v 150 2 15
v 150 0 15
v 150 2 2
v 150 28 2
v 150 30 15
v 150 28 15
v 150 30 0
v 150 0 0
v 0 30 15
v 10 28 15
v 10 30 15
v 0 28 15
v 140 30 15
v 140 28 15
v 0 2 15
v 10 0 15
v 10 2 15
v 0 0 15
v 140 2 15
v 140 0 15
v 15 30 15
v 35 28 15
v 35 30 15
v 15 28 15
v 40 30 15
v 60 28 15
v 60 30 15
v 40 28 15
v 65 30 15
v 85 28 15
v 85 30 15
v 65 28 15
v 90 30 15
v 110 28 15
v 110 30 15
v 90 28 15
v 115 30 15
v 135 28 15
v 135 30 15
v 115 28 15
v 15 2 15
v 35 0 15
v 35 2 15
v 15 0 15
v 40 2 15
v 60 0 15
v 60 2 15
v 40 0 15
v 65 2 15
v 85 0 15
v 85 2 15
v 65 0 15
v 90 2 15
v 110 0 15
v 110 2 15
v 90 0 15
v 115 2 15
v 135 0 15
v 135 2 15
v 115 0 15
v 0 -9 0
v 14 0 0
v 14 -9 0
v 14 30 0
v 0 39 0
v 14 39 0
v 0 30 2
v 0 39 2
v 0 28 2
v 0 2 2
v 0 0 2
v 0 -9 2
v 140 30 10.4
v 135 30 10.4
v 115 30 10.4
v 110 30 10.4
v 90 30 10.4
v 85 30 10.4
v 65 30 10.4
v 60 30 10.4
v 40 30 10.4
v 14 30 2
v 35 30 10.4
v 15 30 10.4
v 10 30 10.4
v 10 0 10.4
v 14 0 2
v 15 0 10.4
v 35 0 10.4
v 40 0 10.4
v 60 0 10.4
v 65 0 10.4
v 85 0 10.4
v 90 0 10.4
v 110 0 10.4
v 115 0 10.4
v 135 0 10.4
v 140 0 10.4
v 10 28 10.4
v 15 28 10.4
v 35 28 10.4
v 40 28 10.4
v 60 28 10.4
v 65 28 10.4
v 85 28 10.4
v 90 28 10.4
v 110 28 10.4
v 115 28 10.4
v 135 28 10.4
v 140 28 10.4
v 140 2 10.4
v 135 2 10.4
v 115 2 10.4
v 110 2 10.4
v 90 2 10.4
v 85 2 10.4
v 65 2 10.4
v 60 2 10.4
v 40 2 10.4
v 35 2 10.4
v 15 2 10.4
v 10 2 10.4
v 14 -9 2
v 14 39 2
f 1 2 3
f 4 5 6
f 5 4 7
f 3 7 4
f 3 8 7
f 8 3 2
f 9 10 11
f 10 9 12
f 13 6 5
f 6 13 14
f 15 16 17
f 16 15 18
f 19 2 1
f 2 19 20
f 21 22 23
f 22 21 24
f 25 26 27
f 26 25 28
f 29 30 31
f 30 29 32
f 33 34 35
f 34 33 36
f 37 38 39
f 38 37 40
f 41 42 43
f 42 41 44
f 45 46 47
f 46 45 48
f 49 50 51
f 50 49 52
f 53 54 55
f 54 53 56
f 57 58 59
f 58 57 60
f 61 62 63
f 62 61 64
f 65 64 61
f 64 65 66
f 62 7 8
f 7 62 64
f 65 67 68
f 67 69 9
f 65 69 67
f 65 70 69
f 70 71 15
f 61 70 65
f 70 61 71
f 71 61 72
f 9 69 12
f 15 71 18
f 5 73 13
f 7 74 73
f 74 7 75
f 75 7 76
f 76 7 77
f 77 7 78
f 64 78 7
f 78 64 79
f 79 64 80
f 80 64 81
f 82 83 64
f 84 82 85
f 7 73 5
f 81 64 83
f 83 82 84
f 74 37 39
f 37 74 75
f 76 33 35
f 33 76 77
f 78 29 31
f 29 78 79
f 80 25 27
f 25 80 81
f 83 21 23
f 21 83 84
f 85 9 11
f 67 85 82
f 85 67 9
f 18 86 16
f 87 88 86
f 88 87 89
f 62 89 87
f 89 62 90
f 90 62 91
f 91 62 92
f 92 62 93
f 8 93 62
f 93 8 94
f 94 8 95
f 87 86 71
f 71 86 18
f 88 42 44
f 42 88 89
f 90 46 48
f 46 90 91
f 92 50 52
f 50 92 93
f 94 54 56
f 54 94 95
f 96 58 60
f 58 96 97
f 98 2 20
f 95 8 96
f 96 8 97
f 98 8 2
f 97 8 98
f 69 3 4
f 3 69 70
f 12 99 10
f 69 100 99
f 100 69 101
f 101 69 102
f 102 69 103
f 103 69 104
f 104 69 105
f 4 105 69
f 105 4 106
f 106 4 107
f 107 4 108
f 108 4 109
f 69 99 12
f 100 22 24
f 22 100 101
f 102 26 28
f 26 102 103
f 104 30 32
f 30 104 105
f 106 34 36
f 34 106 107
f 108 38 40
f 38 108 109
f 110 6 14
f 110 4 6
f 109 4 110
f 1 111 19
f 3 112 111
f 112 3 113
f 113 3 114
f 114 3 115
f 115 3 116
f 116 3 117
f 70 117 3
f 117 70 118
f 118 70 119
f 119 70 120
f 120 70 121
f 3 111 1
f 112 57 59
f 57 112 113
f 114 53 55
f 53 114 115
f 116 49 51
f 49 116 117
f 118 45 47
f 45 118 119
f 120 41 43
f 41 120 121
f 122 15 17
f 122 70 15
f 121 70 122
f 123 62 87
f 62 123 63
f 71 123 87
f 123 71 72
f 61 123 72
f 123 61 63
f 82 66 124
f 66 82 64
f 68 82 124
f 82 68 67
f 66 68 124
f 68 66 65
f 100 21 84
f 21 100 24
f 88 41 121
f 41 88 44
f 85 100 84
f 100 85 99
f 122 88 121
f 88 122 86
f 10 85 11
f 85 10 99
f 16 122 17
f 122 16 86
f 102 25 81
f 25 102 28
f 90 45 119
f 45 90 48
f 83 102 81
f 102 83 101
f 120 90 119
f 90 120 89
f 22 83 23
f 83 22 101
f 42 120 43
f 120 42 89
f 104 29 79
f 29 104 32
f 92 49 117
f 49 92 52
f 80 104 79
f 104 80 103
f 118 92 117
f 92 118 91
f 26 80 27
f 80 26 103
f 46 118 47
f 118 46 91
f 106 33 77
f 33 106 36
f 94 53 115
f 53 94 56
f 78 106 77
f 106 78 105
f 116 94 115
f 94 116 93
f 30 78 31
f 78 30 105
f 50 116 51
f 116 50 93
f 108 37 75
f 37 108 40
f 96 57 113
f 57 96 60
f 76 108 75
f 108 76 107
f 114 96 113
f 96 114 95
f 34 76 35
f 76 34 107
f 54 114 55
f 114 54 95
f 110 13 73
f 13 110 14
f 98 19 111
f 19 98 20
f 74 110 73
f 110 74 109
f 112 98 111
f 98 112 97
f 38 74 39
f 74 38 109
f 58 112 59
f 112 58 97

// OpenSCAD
$fn = 32;

// ----------------------------------------------------------------------
// Cable duct: 150 x 30 x 15 mm, 6 fingers
// ----------------------------------------------------------------------

// --- parameters (mm) ---
duct_len = 150;           // duct length, X
duct_w = 30;              // duct width, Y
duct_h = 15;              // duct height, Z
wall_t = 2;               // side wall thickness
floor_t = 2;              // floor thickness
slot_w = 5;               // finger slot width
slot_h = 8.4;             // finger slot height
fingers = 6;              // number of finger slots per side
pitch = 25;               // finger pitch
ear_w = 10;               // mounting ear width
ear_l = 14;               // mounting ear length

module shell() {
  difference() {
    cube([duct_len, duct_w, duct_h]);
    /* open top channel */
    translate([-wall_t - 1, wall_t, floor_t])
      cube([duct_len + 2 * wall_t + 2, duct_w - 2 * wall_t, duct_h + 1]);
  }
}

module ears() {
  translate([0, -ear_w + 1, 0]) cube([ear_l, ear_w, floor_t]);
  translate([0, duct_w - 1, 0]) cube([ear_l, ear_w, floor_t]);
}

difference() {
  union() {
    shell();
    ears();
  }
  /* finger slots cut through both side walls */
  for (i = [0 : fingers - 1]) translate([pitch / 2 + i * pitch - slot_w / 2, -1, floor_t + slot_h]) cube([slot_w, duct_w + 2, duct_h]);
}
